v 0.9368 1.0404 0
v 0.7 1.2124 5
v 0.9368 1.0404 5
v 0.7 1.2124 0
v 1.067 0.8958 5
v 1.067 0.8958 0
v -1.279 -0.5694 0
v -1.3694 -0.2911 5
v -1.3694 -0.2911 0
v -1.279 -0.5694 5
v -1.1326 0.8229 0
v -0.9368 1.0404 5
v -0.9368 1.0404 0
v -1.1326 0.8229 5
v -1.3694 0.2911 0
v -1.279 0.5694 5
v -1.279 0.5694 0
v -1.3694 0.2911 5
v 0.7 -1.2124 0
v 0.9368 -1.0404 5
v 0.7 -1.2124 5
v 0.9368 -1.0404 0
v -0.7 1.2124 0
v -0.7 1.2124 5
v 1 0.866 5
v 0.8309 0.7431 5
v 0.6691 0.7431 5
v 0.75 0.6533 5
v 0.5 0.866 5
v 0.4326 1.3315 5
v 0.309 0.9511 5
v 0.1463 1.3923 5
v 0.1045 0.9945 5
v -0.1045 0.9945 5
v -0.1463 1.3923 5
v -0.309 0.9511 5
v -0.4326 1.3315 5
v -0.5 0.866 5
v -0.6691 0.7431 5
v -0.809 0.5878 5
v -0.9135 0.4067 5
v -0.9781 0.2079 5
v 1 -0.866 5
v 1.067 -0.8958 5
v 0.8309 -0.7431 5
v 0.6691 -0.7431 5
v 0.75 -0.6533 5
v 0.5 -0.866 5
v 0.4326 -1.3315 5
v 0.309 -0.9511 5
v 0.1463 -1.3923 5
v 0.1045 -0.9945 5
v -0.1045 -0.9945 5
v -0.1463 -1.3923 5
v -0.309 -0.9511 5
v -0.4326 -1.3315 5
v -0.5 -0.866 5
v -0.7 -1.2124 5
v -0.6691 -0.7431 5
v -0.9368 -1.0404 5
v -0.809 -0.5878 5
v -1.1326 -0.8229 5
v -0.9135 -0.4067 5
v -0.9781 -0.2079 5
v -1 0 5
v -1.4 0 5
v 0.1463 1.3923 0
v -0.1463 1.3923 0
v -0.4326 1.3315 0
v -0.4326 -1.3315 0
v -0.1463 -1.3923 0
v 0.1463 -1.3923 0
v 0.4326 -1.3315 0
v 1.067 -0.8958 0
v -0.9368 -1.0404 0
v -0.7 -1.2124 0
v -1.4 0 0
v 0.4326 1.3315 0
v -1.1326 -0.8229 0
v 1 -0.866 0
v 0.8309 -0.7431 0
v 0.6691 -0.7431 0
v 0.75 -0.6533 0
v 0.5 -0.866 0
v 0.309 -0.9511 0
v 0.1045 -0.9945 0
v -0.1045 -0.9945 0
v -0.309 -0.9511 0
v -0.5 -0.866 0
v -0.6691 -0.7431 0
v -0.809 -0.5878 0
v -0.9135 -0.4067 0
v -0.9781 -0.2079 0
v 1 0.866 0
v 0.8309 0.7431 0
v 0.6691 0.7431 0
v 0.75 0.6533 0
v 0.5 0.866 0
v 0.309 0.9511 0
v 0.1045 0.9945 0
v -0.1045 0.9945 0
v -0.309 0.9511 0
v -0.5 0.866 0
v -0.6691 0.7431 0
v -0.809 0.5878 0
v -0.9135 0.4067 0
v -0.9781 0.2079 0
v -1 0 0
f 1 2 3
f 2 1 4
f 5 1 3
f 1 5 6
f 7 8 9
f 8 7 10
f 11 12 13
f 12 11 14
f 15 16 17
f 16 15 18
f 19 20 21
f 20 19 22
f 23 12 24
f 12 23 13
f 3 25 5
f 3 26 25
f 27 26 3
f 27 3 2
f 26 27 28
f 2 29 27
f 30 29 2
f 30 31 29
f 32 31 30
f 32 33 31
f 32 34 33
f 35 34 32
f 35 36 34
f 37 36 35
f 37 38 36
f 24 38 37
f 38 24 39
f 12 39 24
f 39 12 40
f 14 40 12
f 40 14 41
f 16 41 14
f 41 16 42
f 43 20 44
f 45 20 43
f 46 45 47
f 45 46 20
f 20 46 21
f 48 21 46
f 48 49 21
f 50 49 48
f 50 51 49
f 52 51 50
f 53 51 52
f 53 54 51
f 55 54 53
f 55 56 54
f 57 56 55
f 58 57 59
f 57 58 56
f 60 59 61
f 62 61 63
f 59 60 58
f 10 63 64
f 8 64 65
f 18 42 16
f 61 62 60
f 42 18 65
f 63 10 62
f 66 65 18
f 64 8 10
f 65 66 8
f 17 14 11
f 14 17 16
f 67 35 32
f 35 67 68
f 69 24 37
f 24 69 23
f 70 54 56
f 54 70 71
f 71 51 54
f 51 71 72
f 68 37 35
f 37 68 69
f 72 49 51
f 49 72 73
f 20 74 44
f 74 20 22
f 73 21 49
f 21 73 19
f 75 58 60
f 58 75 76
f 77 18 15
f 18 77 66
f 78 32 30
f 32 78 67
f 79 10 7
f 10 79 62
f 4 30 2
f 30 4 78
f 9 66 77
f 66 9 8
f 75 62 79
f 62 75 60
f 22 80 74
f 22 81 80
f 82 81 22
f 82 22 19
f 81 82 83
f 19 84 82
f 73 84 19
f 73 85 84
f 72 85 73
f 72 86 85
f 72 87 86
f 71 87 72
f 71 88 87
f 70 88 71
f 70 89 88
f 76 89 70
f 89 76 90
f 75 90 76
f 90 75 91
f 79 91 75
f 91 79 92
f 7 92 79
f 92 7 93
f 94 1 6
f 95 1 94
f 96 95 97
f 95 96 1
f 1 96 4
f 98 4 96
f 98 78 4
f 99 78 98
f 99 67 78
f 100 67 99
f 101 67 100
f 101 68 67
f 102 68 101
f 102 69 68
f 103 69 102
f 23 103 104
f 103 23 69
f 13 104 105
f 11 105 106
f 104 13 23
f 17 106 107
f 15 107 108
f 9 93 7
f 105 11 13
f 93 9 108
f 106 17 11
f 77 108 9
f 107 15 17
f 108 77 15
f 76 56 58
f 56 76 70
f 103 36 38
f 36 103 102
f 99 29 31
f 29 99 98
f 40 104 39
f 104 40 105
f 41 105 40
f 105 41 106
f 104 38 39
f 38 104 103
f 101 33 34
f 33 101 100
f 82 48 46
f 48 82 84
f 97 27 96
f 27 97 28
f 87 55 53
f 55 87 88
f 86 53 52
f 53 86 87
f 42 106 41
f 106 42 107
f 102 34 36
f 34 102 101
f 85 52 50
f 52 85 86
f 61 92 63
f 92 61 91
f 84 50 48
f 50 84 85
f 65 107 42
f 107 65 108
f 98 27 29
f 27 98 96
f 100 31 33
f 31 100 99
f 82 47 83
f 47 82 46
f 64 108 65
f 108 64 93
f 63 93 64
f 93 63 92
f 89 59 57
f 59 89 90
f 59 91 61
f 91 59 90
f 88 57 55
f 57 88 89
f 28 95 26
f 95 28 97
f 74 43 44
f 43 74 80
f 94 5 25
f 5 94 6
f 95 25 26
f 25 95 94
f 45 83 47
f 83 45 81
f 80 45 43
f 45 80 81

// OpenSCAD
module cableHolder(cableOD=2){
    union(){
        
        
        difference(){
            fudgeFactor = 1.4;
            cylinder(d=cableOD*fudgeFactor,h=5,$fn=30);
            cylinder(d=cableOD,h=12,$fn=30,center=true);
            #translate([1.5,0,-0.5]) cylinder(d=cableOD,h=6,$fn=30);
        }
    }
    
    
    
    
}
cableHolder();
